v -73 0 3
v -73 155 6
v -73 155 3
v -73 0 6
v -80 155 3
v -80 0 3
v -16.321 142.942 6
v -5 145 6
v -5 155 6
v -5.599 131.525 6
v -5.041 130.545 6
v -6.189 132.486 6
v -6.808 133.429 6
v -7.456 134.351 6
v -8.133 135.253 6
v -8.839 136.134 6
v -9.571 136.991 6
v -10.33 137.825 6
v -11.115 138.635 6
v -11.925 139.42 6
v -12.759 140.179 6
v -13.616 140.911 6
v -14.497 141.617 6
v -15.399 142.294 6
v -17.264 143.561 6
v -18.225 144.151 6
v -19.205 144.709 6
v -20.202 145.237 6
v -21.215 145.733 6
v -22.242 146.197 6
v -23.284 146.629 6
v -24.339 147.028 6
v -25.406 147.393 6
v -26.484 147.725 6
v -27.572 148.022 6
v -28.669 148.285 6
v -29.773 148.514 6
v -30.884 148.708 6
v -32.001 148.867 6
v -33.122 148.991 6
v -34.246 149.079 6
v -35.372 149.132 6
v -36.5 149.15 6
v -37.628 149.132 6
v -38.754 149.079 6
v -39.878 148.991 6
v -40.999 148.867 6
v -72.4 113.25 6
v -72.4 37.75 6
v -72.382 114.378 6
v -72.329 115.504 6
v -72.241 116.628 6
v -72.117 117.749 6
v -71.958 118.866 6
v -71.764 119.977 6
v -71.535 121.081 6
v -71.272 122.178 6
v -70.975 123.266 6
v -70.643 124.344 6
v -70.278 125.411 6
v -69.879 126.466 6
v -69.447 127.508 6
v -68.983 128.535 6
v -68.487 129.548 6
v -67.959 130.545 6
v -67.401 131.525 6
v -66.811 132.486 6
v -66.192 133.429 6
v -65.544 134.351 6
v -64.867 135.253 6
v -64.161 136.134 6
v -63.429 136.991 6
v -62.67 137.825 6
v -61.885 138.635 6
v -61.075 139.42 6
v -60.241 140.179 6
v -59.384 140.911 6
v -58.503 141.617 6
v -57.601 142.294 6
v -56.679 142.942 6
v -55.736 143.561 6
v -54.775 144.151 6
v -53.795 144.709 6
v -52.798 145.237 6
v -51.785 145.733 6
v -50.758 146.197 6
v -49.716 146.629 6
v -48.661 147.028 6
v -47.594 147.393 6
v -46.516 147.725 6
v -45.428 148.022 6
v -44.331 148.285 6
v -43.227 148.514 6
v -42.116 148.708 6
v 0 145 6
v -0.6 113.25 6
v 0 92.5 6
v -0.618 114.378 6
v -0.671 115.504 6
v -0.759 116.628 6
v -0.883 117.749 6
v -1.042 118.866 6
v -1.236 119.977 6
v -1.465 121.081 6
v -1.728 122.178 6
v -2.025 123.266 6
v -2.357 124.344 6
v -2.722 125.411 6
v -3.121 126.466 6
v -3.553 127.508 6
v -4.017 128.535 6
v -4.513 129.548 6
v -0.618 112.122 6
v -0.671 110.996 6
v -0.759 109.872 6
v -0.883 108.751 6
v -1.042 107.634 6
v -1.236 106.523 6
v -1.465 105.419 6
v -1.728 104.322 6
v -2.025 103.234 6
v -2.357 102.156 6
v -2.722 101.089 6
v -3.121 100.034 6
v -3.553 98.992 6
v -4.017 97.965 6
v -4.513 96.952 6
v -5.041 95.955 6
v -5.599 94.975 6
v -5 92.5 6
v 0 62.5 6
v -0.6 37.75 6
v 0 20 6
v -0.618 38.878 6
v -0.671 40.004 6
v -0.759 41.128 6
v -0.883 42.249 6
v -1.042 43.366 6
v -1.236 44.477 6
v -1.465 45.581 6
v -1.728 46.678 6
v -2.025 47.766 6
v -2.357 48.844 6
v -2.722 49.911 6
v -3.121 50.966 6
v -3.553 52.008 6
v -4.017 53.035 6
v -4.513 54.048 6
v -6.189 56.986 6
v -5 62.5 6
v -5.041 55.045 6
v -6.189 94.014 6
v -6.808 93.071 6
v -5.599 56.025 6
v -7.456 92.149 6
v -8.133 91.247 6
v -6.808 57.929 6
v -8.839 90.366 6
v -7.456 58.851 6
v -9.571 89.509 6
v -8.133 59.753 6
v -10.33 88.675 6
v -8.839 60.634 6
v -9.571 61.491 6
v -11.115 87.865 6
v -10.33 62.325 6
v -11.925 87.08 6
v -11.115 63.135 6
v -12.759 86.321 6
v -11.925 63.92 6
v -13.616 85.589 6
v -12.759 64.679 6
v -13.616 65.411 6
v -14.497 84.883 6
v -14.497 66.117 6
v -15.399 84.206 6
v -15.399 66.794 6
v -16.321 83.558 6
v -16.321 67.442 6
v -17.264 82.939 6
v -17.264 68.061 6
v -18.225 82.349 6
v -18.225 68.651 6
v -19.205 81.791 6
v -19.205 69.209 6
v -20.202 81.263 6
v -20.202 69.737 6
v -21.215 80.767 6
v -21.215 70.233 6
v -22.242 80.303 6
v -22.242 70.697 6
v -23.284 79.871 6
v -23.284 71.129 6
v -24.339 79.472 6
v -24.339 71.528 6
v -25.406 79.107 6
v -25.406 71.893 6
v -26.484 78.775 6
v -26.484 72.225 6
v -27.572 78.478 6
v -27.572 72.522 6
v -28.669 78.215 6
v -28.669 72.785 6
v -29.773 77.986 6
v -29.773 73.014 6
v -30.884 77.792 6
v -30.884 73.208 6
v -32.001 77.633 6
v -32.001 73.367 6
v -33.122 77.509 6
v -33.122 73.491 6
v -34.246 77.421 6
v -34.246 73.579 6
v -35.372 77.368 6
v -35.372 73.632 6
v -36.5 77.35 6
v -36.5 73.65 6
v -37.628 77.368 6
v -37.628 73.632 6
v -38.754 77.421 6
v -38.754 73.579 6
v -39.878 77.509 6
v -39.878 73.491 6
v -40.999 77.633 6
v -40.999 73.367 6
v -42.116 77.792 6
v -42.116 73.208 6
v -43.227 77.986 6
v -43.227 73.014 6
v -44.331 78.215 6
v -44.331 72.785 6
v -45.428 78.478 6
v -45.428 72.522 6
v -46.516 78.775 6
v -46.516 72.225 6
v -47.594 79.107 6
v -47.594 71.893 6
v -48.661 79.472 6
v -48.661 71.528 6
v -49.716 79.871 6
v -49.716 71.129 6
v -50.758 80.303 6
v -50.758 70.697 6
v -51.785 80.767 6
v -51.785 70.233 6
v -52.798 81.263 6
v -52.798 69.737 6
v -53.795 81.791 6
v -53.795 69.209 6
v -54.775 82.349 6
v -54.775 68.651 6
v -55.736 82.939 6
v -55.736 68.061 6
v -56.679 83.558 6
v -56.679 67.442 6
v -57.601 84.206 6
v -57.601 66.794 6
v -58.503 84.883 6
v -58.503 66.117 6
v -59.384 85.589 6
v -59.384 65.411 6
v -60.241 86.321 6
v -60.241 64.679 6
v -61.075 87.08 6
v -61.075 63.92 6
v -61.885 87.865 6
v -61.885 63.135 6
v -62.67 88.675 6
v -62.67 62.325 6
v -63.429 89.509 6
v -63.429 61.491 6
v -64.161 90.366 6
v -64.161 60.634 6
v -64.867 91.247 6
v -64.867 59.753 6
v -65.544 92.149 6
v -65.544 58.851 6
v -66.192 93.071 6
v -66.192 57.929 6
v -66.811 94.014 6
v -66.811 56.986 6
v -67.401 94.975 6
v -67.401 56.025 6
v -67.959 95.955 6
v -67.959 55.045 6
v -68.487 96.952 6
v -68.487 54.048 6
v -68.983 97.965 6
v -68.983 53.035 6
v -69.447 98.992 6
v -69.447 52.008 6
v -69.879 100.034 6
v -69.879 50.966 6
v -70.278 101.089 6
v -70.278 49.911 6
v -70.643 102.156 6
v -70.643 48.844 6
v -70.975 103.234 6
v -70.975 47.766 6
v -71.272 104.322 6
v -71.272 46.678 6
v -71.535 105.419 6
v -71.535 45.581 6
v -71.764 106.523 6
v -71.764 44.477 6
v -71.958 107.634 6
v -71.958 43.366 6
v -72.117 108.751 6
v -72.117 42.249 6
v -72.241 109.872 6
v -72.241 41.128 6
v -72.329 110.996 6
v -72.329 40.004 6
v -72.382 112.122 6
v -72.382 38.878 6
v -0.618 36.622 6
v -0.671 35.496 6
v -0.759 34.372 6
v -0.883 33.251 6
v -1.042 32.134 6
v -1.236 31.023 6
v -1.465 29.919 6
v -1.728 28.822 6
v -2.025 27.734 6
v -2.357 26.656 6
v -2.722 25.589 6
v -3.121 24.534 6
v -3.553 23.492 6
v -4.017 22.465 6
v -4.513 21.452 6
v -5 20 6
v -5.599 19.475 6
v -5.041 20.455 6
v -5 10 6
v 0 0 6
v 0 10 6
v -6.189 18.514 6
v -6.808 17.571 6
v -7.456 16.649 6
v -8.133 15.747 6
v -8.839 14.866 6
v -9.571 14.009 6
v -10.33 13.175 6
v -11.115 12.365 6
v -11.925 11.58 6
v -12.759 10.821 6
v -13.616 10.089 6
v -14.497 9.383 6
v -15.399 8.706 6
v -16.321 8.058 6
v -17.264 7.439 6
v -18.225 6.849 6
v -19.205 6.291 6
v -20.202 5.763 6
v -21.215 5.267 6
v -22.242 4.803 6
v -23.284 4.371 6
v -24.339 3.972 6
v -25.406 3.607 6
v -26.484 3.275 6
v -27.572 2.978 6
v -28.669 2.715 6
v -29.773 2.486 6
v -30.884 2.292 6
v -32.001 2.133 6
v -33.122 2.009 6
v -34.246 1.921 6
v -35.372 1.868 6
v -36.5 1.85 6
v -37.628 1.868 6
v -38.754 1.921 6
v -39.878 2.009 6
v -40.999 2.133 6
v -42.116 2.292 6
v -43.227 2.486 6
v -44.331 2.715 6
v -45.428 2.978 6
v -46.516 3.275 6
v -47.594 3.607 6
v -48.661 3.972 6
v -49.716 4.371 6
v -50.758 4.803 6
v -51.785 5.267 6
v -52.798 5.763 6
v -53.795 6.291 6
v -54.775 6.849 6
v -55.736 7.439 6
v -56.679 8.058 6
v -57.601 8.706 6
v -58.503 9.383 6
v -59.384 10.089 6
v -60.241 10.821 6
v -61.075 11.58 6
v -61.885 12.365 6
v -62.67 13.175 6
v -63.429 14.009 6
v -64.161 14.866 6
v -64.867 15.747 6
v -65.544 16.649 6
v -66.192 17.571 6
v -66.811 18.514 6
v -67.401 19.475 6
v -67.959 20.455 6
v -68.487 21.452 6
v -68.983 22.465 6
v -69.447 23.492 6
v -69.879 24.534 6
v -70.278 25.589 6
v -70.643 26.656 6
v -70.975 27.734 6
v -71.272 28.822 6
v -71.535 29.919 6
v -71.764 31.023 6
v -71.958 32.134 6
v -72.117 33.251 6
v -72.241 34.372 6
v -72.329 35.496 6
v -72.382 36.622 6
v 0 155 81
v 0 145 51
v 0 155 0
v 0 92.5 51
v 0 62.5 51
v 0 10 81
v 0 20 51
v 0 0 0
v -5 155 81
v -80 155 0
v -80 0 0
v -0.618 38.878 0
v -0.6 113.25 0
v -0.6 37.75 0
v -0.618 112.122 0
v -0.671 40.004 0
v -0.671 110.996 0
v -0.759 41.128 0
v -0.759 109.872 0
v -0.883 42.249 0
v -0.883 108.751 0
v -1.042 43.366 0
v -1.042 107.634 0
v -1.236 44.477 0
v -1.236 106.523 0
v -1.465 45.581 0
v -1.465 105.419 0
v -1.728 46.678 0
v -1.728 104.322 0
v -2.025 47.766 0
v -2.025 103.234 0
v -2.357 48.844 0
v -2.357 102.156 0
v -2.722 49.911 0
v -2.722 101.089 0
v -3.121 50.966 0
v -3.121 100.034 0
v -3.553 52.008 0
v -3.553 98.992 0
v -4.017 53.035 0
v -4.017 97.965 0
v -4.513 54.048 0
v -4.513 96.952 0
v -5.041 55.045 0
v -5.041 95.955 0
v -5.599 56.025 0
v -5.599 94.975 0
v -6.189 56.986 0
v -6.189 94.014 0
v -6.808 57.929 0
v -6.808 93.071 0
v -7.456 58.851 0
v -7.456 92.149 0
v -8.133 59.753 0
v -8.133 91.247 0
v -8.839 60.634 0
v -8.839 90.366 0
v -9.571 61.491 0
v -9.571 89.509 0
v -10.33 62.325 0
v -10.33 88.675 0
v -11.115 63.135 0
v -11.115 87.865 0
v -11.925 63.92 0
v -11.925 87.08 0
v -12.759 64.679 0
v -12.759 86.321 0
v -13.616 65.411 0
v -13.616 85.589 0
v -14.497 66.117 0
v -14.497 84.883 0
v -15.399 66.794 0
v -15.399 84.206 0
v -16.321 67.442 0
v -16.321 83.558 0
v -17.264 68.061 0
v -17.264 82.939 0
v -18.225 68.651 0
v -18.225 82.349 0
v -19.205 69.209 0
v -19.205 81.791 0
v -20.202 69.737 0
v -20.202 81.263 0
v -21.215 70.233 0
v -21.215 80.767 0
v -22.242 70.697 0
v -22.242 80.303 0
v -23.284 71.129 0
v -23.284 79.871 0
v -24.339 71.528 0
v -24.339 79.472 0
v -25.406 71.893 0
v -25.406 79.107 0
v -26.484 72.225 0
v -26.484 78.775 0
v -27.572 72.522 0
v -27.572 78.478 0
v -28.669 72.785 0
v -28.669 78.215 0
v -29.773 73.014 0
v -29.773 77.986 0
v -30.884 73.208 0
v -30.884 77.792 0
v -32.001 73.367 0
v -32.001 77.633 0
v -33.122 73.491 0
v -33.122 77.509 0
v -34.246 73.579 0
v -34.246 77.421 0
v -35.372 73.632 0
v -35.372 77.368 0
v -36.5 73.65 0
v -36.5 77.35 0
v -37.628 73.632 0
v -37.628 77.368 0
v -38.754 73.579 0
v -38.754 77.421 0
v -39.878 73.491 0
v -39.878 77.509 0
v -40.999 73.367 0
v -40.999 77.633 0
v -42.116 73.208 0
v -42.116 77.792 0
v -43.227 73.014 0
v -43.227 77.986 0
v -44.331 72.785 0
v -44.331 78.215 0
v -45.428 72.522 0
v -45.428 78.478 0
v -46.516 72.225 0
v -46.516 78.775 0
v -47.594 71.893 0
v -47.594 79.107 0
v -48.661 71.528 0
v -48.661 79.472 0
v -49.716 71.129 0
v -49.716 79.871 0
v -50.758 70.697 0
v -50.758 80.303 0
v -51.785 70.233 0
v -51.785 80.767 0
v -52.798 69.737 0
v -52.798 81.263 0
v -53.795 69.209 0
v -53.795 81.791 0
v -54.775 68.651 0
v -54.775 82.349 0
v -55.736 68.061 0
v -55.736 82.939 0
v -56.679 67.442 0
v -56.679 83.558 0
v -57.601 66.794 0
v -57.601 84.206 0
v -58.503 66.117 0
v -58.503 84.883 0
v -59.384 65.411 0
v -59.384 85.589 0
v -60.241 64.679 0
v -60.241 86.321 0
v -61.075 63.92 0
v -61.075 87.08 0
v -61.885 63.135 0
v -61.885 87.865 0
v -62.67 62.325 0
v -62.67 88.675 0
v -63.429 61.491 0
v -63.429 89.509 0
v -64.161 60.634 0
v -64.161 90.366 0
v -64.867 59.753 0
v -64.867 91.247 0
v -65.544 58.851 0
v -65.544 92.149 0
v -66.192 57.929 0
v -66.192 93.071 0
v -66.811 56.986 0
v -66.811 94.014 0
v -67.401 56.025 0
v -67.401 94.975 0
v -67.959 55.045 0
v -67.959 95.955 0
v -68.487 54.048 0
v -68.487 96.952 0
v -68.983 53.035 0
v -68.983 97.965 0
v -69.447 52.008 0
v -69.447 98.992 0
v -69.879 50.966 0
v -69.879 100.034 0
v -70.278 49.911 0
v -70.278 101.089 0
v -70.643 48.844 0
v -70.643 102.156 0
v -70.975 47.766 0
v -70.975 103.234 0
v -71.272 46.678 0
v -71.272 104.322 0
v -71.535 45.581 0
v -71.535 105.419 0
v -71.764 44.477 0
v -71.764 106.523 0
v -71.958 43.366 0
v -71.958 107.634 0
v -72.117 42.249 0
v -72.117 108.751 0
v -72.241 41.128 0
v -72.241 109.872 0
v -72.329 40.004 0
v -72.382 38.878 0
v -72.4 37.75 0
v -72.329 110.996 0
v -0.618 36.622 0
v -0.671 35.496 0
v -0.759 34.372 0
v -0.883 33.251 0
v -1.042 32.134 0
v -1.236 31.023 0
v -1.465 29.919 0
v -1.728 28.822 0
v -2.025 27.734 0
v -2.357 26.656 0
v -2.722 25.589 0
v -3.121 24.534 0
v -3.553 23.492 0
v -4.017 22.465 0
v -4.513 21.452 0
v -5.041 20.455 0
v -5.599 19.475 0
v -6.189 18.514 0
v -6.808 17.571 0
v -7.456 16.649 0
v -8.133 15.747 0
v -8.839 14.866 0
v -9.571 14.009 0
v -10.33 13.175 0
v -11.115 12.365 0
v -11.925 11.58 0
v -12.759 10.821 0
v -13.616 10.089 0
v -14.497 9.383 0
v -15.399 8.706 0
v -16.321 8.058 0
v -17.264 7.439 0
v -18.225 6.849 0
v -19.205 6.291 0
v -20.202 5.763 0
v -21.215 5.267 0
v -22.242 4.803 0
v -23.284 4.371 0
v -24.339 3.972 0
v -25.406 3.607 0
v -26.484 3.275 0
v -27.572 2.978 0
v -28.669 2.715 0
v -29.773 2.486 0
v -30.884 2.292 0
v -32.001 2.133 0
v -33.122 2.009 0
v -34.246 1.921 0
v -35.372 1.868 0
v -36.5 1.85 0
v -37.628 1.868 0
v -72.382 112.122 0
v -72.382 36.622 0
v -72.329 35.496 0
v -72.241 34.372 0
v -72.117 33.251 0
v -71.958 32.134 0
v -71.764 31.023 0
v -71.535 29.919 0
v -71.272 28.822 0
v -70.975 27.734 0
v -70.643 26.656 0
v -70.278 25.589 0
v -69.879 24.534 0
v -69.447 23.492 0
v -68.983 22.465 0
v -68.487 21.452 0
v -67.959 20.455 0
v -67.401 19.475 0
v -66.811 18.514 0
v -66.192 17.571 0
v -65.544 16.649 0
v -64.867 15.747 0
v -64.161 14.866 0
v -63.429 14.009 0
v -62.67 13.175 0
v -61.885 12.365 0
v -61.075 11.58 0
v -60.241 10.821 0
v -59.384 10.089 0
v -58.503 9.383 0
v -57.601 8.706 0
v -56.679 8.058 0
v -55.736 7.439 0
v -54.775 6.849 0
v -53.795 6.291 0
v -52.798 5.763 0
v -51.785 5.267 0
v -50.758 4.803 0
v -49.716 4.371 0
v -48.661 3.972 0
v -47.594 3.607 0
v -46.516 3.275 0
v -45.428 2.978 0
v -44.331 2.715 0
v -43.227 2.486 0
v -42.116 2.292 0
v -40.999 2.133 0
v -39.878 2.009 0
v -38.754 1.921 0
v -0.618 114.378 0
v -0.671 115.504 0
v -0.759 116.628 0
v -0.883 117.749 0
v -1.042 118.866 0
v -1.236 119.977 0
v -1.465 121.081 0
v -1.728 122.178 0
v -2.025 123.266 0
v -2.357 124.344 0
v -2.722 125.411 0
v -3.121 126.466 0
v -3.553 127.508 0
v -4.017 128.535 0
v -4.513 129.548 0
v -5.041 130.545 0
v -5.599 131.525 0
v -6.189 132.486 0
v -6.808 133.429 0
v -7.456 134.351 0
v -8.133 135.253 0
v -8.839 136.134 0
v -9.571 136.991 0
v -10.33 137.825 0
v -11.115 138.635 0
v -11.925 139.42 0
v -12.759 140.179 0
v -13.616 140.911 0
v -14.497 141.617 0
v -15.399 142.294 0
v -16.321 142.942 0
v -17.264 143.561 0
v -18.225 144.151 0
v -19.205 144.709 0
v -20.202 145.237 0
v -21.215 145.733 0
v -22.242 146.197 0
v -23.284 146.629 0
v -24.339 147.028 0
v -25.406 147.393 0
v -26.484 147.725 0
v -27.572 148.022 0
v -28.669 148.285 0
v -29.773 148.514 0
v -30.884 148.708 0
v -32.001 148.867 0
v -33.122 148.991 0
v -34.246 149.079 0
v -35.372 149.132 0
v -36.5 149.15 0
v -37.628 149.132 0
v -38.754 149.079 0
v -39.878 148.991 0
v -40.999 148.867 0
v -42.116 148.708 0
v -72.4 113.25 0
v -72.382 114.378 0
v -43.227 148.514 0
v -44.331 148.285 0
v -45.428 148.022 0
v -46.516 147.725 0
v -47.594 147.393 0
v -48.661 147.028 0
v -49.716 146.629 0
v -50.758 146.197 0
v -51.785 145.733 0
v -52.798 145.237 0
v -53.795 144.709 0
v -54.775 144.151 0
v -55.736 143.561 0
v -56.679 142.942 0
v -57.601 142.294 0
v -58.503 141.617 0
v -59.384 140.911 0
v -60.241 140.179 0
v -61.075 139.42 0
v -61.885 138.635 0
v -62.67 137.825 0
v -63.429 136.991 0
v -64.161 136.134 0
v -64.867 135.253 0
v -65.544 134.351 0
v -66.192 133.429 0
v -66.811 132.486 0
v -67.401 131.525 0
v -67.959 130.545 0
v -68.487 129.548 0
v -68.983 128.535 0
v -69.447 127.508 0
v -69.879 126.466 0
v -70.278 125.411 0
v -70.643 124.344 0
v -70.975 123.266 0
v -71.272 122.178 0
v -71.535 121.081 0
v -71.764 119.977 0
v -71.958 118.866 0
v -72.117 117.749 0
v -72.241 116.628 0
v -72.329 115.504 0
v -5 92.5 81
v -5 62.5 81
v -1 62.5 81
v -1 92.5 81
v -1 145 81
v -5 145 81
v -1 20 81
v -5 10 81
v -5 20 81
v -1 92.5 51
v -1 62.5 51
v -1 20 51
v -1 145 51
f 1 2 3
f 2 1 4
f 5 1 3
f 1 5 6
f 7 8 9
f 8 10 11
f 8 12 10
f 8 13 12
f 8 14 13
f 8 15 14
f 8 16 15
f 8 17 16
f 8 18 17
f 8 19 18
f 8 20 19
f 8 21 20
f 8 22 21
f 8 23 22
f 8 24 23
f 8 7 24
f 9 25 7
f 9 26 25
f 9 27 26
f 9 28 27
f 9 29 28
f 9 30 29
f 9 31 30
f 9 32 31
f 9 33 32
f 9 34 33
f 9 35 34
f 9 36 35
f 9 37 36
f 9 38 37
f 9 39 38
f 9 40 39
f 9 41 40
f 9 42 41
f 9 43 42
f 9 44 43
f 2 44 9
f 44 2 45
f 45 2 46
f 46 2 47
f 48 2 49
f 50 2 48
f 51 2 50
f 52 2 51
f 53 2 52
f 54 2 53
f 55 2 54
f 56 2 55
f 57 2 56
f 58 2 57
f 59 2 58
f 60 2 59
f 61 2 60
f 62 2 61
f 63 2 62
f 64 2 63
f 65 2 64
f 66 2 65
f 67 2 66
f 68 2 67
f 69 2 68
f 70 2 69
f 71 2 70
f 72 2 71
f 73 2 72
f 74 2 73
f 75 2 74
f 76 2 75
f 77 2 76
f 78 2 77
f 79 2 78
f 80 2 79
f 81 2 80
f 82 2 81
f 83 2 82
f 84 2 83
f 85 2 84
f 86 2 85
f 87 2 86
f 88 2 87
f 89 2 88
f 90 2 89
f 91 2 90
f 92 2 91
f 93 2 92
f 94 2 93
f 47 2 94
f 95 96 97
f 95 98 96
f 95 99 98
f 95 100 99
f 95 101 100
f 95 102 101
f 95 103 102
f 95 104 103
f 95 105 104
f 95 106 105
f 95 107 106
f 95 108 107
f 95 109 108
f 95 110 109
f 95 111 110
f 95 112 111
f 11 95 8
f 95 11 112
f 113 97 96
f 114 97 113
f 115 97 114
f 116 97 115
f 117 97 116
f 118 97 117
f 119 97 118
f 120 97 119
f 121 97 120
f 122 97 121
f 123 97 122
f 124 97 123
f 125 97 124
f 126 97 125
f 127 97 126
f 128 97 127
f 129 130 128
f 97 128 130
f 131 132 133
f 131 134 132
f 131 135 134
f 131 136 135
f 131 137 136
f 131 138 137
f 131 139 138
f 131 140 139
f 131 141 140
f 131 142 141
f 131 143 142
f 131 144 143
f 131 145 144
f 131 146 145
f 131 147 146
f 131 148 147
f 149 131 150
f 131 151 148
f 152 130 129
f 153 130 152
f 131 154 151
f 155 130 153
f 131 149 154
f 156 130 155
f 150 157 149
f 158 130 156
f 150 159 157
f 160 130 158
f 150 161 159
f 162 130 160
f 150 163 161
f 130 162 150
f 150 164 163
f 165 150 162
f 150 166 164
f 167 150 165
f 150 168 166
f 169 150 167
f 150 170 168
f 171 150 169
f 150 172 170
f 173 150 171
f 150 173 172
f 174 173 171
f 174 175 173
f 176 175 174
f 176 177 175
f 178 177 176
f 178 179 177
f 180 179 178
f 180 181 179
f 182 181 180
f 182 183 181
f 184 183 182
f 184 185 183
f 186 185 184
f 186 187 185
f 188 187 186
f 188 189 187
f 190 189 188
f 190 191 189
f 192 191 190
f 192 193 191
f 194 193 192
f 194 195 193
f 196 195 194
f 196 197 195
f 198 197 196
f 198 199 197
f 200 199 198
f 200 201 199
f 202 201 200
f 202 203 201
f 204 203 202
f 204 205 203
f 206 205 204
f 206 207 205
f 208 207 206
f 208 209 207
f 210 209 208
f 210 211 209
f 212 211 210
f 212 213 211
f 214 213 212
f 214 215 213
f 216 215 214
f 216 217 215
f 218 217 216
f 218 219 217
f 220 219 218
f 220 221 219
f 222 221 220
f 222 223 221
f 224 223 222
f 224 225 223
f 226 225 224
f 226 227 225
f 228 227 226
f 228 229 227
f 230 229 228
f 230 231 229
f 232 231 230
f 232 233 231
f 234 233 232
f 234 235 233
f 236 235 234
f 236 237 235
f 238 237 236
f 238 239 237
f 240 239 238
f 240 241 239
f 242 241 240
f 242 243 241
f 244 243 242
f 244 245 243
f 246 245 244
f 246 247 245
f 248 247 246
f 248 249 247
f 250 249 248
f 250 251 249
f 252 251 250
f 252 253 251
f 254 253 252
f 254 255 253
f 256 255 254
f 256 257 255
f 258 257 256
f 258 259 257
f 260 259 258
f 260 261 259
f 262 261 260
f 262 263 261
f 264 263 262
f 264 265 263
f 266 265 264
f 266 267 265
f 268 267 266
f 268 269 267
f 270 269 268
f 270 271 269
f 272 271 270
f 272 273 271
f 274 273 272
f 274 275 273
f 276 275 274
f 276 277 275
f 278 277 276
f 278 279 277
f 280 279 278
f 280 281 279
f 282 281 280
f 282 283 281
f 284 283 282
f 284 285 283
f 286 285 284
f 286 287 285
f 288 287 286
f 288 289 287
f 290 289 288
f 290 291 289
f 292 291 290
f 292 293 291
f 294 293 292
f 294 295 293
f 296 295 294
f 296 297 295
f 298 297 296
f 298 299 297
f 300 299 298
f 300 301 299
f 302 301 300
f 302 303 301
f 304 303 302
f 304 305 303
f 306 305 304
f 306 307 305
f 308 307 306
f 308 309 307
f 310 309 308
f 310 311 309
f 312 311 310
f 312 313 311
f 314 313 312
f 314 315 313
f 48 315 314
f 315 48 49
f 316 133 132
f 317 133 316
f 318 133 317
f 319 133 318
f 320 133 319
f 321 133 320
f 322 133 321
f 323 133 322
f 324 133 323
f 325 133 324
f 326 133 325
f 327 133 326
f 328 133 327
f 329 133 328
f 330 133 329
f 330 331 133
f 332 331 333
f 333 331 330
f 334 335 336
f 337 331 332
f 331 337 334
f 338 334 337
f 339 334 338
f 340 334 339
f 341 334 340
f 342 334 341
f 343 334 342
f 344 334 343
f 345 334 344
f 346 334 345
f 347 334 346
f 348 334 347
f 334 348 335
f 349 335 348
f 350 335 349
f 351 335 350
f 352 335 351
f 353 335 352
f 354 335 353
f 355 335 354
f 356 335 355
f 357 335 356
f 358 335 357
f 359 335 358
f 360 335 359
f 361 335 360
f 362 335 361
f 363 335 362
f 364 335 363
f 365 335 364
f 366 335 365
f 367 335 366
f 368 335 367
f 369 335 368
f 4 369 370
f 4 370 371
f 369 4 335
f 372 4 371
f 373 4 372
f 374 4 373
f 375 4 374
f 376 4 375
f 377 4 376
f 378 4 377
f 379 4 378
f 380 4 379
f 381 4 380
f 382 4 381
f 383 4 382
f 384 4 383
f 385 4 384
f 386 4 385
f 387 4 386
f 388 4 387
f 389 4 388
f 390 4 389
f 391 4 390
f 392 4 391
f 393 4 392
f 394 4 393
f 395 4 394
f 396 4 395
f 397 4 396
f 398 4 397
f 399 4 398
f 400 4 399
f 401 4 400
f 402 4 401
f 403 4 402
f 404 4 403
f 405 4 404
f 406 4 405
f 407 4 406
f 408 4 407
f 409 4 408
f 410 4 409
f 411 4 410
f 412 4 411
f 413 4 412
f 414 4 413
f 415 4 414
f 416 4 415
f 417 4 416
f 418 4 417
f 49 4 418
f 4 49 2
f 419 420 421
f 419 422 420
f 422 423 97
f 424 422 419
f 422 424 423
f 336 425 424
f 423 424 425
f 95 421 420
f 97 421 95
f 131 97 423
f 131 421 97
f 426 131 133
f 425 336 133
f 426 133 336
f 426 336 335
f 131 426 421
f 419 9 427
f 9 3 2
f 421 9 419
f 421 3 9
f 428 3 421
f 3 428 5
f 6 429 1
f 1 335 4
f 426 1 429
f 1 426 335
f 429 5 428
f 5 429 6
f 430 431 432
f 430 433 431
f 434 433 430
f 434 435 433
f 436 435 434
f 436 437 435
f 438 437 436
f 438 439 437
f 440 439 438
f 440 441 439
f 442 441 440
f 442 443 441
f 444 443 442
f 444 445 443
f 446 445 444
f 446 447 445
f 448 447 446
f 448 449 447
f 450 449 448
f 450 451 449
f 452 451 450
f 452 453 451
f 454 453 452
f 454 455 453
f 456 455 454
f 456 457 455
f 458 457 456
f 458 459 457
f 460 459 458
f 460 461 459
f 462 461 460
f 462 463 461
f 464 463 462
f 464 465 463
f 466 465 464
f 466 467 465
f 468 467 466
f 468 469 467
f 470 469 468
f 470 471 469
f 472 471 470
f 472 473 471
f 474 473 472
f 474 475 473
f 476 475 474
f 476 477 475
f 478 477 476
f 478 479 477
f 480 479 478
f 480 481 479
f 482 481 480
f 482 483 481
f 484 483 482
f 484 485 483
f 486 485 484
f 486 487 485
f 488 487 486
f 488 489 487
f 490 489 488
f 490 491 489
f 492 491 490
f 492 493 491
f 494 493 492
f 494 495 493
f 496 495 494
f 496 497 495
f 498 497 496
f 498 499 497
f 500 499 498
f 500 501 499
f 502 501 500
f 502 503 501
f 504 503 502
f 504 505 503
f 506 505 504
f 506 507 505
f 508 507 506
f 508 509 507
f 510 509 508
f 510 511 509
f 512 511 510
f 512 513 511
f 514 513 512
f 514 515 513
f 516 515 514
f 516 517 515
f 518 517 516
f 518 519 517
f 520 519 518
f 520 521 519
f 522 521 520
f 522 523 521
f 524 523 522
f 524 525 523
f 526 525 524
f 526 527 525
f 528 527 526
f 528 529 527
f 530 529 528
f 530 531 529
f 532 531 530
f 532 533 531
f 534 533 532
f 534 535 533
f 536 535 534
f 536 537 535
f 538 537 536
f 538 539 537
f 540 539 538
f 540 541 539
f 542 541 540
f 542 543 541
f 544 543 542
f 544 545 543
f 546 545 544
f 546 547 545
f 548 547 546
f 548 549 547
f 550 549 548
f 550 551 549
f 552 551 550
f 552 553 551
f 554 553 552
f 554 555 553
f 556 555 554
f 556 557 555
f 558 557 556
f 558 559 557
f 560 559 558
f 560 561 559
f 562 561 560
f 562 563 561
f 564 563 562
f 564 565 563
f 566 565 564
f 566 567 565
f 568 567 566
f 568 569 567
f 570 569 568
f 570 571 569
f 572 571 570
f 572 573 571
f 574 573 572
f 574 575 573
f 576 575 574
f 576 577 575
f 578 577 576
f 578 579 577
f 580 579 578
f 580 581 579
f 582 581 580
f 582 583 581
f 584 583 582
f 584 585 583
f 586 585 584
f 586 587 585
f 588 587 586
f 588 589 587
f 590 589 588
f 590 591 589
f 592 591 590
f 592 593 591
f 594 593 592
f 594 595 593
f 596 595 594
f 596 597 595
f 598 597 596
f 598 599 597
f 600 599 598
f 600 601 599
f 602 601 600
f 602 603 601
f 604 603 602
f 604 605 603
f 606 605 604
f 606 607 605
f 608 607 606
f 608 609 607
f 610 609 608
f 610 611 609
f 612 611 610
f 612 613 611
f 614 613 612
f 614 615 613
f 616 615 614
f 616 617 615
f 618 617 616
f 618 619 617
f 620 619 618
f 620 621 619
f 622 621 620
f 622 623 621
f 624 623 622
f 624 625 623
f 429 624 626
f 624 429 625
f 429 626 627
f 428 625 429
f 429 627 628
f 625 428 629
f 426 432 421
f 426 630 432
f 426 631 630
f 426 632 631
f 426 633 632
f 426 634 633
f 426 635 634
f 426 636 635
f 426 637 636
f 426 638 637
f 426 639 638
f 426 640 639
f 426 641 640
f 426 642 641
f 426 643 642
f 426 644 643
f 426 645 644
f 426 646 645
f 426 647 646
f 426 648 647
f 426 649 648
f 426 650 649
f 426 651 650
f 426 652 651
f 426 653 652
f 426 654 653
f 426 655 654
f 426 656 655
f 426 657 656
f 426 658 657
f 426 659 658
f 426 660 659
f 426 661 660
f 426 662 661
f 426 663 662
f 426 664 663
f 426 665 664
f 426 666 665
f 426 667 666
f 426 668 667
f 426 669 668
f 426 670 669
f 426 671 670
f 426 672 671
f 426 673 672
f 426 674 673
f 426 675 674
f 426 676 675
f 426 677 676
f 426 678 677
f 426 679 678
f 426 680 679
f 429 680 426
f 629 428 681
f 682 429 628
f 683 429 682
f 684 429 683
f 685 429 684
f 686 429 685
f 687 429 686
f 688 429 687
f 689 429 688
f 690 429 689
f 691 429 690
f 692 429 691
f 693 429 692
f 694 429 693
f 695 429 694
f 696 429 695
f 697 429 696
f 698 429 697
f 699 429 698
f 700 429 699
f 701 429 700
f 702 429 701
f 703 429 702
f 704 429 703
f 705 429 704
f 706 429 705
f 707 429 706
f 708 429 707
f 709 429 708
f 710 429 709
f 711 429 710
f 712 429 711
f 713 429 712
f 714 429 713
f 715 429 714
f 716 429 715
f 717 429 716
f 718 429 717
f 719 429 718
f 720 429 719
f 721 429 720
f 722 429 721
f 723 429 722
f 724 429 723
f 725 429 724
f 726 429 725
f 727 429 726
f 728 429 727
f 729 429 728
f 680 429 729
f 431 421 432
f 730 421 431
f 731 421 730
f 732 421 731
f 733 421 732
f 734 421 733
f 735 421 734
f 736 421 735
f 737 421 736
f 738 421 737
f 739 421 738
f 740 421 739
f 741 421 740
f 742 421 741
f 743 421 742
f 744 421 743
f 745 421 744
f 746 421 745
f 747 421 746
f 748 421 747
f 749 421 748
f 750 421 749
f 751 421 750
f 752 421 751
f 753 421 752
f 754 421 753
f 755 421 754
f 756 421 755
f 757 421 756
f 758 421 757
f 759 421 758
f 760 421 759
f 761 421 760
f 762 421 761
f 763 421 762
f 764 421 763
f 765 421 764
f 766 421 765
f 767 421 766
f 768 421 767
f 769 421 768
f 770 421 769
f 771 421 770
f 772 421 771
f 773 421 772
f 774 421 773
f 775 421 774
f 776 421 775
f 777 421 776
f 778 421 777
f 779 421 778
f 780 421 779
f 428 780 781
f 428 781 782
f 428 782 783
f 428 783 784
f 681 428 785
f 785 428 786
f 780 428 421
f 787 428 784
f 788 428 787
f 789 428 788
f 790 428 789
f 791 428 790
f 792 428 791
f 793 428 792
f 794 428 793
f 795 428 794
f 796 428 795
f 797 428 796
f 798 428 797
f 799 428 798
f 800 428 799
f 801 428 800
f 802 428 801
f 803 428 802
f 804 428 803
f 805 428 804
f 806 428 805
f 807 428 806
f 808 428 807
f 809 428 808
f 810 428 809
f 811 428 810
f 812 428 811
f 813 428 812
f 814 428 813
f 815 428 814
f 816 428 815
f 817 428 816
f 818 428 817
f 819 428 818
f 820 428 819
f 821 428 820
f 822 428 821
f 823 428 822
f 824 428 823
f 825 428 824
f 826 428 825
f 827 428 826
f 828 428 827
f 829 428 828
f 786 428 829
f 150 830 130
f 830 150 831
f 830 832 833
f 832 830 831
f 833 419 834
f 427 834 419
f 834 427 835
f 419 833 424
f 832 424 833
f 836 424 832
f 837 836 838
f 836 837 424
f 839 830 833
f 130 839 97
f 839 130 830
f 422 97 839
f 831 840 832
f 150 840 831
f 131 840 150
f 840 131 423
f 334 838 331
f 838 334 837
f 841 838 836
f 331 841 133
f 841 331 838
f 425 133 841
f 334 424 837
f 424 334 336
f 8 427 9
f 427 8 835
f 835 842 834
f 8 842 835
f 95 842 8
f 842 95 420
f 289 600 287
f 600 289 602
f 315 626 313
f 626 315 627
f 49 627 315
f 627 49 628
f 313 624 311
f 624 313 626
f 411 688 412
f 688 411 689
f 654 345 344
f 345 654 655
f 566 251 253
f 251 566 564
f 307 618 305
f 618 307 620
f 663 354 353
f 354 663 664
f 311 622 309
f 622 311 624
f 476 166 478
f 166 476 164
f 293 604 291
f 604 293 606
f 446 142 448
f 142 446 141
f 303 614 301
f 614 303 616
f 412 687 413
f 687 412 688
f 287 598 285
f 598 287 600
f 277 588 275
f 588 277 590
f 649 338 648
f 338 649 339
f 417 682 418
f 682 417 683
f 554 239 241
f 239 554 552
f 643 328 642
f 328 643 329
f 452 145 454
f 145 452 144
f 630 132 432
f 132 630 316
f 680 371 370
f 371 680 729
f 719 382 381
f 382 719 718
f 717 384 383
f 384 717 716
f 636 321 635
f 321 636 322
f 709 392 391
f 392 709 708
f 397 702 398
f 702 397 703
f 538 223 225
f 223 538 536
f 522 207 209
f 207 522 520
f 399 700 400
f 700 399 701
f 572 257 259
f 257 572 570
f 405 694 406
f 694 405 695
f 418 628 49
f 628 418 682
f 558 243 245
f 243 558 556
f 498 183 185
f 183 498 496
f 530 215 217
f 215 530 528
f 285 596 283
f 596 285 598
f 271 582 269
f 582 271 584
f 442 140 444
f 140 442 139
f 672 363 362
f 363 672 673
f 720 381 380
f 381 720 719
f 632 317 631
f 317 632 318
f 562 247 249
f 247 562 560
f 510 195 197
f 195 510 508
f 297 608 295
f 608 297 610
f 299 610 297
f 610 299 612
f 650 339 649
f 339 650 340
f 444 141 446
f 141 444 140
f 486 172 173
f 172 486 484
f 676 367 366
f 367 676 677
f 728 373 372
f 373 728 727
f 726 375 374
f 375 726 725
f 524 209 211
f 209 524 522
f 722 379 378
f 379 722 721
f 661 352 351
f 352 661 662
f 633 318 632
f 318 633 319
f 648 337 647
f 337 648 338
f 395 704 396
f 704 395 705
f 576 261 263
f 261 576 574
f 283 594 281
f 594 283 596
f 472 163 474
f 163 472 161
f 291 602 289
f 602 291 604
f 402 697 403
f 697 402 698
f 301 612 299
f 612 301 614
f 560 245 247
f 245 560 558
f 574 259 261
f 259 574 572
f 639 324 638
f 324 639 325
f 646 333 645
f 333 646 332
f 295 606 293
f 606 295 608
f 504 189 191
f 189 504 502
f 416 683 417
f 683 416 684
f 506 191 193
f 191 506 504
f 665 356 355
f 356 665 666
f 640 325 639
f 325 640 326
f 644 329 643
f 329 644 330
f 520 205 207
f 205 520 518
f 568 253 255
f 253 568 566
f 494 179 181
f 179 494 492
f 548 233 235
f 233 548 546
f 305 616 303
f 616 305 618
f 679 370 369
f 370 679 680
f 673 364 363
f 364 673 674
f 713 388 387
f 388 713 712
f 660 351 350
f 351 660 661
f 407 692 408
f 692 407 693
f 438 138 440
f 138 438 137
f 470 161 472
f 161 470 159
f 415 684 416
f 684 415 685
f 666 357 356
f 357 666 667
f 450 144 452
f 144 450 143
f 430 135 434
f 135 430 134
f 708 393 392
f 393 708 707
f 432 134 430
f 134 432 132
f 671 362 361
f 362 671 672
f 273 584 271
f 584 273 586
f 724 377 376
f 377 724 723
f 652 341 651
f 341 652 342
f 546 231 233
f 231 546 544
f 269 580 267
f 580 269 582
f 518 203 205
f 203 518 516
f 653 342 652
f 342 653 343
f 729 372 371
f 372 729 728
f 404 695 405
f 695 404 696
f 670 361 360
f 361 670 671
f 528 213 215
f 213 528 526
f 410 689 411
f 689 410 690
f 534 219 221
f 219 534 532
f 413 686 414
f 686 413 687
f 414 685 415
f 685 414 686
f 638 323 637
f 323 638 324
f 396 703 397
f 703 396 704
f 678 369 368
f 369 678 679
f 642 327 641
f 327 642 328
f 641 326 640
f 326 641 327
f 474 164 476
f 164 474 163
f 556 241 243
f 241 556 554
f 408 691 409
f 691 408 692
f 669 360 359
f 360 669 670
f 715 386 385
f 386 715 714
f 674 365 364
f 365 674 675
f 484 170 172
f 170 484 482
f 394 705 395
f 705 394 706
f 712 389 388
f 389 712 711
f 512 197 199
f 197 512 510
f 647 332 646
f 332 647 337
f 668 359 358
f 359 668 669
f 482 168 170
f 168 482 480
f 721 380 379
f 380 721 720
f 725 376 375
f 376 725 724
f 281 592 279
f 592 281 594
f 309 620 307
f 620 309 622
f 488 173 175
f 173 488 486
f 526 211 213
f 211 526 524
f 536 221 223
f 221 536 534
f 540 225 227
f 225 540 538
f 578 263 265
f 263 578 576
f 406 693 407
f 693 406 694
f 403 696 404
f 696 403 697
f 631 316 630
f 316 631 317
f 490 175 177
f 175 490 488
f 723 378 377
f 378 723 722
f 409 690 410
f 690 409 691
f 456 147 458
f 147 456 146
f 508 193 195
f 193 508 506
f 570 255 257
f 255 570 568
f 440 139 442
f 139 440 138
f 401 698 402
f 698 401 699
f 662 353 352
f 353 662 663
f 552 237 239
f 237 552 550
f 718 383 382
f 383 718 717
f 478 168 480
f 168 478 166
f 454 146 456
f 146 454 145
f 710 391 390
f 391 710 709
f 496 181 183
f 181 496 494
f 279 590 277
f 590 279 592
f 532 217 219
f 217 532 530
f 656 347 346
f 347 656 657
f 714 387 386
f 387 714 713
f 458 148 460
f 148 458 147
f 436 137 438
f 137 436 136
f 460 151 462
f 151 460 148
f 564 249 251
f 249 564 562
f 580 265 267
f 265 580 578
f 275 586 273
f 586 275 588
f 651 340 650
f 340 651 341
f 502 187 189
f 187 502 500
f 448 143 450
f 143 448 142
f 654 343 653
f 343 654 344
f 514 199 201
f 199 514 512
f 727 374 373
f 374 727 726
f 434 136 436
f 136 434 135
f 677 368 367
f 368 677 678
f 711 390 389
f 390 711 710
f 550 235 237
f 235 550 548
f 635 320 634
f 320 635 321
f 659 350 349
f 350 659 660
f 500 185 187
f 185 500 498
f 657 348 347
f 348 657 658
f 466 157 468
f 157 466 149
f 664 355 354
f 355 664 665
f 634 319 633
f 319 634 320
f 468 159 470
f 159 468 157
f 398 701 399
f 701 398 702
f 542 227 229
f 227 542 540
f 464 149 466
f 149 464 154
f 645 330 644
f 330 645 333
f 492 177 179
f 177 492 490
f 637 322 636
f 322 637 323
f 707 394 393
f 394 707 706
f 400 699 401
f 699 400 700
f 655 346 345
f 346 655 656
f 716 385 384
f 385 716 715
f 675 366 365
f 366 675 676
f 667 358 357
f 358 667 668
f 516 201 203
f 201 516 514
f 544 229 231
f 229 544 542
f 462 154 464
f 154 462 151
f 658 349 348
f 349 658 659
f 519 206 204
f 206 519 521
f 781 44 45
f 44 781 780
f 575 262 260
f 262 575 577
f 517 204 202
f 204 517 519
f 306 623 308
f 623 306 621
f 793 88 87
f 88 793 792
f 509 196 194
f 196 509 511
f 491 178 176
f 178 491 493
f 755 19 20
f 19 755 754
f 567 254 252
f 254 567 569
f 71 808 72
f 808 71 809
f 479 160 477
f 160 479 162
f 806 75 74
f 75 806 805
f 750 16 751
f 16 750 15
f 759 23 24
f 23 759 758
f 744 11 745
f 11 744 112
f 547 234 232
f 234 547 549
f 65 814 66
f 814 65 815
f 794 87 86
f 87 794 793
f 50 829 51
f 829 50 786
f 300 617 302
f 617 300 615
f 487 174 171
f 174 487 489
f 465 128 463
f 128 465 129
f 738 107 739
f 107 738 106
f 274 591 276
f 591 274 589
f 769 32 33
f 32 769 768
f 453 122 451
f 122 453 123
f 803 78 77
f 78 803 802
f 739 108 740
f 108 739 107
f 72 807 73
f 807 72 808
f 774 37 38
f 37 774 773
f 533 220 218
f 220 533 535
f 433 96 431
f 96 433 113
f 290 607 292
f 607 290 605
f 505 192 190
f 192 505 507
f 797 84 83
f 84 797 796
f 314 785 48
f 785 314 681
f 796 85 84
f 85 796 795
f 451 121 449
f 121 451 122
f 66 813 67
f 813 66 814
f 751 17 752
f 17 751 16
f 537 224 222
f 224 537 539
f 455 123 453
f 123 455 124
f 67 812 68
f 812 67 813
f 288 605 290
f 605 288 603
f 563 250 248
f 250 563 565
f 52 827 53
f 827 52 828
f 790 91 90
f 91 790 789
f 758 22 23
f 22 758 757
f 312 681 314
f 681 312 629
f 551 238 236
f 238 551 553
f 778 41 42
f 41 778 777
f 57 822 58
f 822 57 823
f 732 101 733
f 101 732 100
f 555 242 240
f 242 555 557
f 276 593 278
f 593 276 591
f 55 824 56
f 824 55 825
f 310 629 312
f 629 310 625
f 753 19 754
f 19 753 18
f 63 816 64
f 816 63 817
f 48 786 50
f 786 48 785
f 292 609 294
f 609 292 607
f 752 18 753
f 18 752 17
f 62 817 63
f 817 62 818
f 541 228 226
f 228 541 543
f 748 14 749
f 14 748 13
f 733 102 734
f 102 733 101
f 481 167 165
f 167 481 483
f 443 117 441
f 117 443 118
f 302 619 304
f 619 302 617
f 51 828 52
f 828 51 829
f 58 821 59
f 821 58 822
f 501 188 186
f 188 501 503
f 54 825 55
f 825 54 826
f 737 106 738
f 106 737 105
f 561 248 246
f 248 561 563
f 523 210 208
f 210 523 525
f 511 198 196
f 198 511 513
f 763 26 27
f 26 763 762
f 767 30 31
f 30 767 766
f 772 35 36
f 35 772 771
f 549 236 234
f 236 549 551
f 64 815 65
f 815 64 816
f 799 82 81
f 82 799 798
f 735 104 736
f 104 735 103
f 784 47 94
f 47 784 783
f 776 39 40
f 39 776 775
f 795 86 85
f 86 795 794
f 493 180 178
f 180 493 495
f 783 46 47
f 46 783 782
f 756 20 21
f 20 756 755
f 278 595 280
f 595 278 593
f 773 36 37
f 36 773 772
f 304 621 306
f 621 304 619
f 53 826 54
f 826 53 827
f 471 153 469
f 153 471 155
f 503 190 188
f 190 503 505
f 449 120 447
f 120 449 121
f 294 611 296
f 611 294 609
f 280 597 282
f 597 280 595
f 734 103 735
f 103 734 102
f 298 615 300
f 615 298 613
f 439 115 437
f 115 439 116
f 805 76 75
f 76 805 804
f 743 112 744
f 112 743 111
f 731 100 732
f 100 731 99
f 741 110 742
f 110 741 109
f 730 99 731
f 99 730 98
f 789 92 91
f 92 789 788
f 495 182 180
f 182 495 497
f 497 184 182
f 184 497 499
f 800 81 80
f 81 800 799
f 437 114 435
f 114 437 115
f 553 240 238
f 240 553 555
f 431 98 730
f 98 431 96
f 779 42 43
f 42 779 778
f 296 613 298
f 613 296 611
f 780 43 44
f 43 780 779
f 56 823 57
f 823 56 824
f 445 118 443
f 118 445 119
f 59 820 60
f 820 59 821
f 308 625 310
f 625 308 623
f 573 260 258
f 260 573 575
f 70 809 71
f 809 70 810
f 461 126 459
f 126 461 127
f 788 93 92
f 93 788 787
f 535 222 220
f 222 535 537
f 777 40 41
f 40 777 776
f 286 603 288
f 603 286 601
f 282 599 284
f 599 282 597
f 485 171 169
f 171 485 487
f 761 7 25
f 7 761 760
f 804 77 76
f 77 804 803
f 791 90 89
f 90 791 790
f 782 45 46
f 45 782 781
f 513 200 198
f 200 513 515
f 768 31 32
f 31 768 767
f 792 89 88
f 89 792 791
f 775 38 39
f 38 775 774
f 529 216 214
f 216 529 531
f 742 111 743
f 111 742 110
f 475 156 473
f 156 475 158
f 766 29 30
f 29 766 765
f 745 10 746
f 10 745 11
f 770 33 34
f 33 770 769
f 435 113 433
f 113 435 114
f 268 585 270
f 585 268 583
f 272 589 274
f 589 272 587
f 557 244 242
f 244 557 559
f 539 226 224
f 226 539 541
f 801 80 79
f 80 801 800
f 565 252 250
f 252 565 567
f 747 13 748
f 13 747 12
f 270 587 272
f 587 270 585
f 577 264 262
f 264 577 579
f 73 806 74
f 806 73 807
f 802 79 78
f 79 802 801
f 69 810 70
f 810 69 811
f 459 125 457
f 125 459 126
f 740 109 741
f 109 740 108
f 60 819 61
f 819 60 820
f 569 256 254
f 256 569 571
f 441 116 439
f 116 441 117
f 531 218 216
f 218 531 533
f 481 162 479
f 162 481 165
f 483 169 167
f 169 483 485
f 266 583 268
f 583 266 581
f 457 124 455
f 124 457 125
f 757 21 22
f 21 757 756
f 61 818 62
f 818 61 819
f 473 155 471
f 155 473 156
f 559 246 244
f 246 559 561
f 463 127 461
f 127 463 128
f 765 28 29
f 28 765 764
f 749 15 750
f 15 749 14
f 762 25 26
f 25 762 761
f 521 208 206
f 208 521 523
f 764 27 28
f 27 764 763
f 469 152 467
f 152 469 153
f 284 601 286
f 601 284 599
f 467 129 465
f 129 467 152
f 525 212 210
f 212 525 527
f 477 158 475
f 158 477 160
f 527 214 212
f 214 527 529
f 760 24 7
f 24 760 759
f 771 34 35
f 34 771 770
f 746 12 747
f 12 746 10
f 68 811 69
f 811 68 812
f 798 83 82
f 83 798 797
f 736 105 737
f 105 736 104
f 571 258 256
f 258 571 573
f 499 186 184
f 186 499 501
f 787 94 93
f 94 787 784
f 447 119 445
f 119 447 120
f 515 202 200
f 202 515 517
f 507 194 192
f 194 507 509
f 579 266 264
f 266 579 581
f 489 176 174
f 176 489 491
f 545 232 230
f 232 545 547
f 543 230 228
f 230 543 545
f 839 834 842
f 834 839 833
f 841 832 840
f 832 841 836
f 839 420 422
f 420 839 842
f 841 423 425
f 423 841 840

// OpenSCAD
fin_thickness = 5;
top_extruder_width = 80;
inner_toplayer_width = 73;
toplayer_height = 3;
can_radius = 35.5; // 1mm to spare
lower_body_height = 75;
top_part_length = 155;
back_part_length = 145;
profile = 0.2;

rotate(a=[0,180,0]){
    translate(v=[0,0,-6]){
        union() {
            difference() {
                union() {
                    // this is the main body
                    cube([inner_toplayer_width,top_part_length,toplayer_height]);
                    translate(v=[0,0,toplayer_height]){
                        // this is on top of the main body
                        // intended to go over the edge 
                        cube([top_extruder_width,top_part_length,toplayer_height]);
                    }
                    translate(v=[0,62.5,-lower_body_height]){
                        // center reinforcement fin
                        cube([fin_thickness,30,lower_body_height]);
                    }
                    translate(v=[0,10,-lower_body_height]){
                        // left reinforcement fin
                        cube([fin_thickness,10,lower_body_height]);
                    }
                    translate(v=[0,back_part_length,-lower_body_height]){
                        // right reinforcement fin
                        cube([fin_thickness,10,lower_body_height]);
                    }
                }
                translate(v=[36.5, 37.75, -180]){
                    cylinder(r=can_radius+2*profile, h=200, $fn=200);    
                }
                translate(v=[36.5,113.25, -180]){
                    cylinder(r=can_radius+2*profile, h=200, $fn=200);    
                }
            }
            translate(v=[0,10,-75]){
                    // the long cube on the back
                    // TODO: need to add something
                    // so it cannot move from front
                    // to back.
                    cube([1,back_part_length,30]);
                }
        }
    }
}
